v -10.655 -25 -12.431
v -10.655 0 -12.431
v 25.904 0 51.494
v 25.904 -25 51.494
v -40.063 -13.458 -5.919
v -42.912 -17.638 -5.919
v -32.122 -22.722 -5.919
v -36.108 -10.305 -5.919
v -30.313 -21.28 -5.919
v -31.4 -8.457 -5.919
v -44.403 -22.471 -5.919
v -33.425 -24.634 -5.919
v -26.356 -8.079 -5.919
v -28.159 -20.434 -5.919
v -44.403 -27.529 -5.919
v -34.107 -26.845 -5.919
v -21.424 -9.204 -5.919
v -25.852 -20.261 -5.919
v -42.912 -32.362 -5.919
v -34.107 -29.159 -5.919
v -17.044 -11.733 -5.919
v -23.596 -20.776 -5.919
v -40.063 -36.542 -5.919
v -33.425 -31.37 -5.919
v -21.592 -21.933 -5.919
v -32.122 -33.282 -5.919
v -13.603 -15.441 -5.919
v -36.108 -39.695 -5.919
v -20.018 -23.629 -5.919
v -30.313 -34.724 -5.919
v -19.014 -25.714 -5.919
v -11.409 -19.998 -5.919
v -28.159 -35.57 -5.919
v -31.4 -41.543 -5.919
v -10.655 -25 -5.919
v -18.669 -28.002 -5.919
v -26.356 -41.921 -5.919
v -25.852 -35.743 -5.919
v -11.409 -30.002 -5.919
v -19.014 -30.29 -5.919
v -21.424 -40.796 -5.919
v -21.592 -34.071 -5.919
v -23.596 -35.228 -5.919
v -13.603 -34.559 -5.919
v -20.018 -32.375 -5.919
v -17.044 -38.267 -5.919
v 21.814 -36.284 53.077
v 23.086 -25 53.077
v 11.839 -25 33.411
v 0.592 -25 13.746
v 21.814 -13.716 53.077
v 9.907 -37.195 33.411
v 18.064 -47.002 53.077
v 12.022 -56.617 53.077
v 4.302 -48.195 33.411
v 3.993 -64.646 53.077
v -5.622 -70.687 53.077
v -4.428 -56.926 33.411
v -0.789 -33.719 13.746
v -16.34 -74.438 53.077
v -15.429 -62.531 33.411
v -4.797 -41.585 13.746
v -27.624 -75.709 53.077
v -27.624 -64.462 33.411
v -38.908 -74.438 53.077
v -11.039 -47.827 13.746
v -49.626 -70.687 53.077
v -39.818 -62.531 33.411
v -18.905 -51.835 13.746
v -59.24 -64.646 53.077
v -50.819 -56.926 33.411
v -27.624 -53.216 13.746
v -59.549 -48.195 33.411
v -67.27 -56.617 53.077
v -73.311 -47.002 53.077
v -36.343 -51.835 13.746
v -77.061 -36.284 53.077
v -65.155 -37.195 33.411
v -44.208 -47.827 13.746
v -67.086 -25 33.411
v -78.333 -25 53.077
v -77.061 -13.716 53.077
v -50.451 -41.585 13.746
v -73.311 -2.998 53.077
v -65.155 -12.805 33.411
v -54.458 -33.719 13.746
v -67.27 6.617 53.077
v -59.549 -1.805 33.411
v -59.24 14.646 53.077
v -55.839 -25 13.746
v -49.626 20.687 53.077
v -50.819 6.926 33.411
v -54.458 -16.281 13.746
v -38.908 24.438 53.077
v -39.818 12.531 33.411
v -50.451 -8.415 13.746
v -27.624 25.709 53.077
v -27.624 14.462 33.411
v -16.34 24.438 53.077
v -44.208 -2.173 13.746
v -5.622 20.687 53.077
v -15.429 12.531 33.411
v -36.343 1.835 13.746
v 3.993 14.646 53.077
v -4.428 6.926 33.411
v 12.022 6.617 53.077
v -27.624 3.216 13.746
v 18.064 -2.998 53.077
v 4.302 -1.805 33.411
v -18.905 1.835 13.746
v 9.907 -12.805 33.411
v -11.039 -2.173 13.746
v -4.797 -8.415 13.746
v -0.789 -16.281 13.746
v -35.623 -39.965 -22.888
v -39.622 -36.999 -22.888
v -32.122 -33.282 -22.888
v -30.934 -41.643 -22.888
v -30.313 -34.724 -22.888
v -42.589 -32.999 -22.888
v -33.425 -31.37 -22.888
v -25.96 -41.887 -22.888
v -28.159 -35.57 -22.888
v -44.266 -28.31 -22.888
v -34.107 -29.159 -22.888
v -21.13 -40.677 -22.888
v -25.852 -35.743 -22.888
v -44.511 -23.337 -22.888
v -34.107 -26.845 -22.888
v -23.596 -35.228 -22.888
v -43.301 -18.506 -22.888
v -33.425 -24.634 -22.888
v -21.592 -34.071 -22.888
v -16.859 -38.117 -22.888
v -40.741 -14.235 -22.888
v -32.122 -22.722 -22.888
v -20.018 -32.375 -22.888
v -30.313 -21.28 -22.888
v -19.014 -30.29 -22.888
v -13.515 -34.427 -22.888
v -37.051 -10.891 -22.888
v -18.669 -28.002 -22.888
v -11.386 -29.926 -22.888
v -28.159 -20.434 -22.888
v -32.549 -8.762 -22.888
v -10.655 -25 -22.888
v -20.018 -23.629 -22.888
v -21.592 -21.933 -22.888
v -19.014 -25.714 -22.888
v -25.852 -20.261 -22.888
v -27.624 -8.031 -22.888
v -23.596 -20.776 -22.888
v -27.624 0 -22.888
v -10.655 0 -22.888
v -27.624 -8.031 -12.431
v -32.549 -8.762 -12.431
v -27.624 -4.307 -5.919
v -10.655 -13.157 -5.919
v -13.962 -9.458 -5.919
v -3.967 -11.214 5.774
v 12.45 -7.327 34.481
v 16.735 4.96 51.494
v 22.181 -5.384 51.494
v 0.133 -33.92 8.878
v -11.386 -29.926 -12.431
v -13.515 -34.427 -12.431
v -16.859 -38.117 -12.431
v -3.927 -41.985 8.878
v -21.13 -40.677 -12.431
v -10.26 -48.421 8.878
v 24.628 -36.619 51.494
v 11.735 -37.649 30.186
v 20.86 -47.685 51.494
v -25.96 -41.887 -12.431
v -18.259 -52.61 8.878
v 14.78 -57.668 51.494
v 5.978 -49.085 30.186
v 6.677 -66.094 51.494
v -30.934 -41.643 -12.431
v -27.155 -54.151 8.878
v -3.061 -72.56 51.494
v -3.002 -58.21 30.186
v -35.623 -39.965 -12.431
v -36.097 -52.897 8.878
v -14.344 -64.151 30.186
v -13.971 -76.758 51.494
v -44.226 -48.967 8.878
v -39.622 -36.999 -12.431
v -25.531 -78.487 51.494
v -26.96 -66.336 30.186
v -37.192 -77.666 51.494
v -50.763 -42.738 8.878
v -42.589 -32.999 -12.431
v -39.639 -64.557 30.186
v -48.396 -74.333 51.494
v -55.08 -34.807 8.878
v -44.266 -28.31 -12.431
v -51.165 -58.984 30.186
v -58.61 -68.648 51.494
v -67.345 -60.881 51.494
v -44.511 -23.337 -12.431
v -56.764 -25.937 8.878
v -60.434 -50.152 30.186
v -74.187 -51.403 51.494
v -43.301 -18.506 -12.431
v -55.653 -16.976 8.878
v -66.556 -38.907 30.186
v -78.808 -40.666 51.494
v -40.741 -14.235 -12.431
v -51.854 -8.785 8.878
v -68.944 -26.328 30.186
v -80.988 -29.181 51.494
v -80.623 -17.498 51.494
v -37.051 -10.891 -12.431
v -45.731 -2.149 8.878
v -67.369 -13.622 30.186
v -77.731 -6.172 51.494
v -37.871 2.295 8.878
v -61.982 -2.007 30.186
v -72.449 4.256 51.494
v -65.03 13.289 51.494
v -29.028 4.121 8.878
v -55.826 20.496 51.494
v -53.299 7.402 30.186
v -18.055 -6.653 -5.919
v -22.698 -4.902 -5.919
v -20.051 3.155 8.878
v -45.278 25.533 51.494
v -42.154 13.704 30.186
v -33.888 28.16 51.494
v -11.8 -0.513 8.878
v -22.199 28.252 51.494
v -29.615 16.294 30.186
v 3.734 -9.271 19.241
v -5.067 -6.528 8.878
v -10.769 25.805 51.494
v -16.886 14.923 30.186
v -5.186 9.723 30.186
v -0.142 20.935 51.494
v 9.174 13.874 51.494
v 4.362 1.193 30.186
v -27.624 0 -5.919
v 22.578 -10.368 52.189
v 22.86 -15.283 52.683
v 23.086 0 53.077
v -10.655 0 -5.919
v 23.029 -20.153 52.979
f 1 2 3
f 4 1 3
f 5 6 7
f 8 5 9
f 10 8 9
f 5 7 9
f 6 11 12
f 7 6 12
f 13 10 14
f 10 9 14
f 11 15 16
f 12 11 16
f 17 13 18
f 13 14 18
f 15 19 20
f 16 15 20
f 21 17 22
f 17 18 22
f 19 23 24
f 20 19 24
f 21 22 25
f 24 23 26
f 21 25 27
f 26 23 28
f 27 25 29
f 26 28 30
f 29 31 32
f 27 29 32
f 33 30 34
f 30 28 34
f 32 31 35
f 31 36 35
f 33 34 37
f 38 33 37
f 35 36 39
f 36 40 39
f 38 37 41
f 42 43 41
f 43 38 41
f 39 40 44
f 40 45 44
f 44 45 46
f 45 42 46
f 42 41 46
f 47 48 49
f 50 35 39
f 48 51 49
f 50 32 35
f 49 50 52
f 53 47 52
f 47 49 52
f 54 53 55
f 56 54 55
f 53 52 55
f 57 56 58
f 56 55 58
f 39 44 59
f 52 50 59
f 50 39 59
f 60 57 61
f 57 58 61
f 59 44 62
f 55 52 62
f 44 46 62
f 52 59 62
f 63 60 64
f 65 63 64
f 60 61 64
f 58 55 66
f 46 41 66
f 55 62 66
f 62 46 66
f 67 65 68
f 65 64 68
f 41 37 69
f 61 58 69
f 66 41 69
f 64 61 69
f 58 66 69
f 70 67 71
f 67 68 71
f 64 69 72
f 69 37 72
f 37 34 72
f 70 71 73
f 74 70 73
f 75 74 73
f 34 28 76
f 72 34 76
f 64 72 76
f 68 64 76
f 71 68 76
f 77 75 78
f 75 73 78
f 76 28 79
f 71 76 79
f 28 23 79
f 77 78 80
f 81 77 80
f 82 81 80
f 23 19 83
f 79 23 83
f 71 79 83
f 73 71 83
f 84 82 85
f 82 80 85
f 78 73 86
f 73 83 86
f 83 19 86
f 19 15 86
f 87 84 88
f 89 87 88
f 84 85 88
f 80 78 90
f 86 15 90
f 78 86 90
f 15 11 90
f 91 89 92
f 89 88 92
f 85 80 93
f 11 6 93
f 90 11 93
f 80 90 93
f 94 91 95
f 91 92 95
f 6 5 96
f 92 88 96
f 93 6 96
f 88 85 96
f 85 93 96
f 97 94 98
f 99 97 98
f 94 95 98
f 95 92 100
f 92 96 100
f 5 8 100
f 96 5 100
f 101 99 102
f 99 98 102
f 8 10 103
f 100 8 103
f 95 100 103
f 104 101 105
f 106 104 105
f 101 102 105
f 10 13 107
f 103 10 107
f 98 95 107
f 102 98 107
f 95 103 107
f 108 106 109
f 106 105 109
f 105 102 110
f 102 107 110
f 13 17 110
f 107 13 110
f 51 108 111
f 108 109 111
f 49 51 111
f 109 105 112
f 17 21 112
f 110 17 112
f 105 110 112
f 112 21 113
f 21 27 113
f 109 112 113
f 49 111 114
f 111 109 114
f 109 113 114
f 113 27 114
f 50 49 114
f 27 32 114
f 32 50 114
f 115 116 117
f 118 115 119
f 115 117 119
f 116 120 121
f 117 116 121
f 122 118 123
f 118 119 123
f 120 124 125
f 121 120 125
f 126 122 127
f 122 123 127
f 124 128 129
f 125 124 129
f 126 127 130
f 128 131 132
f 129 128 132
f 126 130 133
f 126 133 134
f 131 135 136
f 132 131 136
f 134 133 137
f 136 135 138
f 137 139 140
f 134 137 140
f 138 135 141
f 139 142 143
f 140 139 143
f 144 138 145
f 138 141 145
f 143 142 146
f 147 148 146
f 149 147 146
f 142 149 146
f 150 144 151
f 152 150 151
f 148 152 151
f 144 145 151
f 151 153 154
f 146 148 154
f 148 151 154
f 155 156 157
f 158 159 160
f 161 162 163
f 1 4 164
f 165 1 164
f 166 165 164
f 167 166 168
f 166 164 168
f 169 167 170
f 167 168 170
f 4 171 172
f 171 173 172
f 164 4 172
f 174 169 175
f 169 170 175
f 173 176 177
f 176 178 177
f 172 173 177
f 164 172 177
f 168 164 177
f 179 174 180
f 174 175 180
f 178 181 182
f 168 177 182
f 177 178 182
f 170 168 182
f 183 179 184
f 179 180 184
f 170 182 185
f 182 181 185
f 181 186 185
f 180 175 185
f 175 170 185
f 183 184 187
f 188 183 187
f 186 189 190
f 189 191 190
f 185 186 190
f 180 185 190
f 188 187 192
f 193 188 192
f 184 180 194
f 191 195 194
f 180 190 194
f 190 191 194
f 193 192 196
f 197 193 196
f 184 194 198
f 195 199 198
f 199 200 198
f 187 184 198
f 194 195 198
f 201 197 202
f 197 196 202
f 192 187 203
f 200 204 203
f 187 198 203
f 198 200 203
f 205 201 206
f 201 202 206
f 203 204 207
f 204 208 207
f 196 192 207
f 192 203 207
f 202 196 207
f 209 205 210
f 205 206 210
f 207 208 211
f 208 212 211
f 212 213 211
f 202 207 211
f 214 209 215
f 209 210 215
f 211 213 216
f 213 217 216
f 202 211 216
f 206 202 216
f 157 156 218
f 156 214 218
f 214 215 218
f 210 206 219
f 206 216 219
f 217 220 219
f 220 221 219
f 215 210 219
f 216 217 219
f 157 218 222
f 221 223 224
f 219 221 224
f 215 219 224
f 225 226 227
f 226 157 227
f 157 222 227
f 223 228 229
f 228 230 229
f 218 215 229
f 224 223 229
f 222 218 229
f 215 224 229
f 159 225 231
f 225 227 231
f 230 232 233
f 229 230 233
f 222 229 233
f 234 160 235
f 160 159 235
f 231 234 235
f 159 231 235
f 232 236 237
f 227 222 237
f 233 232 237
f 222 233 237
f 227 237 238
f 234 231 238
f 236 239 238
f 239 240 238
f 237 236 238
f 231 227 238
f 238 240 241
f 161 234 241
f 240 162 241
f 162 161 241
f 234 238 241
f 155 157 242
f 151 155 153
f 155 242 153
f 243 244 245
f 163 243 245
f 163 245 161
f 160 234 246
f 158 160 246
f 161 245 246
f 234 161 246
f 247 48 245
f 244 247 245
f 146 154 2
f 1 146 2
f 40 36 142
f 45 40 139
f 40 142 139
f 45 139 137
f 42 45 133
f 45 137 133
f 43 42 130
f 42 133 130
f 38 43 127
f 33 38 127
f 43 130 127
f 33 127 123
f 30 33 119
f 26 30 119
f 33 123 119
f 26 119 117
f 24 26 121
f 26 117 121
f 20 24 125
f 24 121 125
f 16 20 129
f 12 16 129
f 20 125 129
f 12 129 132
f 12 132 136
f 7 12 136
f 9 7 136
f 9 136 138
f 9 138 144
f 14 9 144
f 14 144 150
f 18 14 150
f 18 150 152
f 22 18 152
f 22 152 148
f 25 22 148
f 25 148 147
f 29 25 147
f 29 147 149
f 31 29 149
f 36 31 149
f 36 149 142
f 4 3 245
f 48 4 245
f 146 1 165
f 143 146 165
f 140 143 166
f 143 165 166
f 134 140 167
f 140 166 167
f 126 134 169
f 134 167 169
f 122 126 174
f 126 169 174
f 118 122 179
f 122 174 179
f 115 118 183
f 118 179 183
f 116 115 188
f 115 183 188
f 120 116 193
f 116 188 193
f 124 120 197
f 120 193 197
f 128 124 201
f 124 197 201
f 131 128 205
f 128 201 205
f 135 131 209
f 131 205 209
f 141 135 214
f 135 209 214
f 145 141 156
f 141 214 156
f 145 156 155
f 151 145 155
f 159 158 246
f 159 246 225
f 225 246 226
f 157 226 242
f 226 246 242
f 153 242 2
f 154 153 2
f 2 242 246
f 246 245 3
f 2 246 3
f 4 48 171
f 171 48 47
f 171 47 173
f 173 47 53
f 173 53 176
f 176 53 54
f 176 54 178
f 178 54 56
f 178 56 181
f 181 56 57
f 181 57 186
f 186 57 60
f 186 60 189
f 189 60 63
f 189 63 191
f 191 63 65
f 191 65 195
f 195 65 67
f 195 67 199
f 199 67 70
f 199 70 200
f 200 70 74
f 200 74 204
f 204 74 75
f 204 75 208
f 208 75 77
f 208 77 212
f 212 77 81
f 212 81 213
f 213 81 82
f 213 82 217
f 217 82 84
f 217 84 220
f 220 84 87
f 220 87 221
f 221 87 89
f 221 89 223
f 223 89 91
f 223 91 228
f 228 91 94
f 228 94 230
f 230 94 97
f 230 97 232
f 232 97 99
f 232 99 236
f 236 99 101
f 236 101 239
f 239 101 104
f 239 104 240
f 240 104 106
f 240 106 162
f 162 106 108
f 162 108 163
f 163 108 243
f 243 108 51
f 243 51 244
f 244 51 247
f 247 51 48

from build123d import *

# Parameters (mm, degrees)
F1_DEPTH = 25
F3_R     = 7.7623093382
F4_DEPTH = 25


with BuildPart() as f1:
    # F0 (on Front) → F1 (new body)
    with BuildSketch(Plane.XZ):
        Polygon((25.9043528415, 51.4944938206), (23.085501045, 53.0769191682), (-10.6548462063, -5.9193591587), (-27.623673901, -5.9193591587), (-27.623673901, -22.8881891817), (-10.6548462063, -22.8881891817), (-10.6548462063, -12.4306539074), align=None)
    extrude(amount=F1_DEPTH)

    # F1_face (on face) → F2 (revolve)
    with BuildSketch(Plane(origin=(-7.5947034843, -25, 1.5087803319), x_dir=(1, 0, 0), z_dir=(0, -1, 0))):
        Polygon((33.4990563258, 49.9857134887), (30.6802045293, 51.5681388363), (-3.060142722, -7.4281394906), (-20.0289704167, -7.4281394906), (-20.0289704167, -24.3969695136), (-3.060142722, -24.3969695136), (-3.060142722, -13.9394342393), align=None)
    revolve(axis=Axis((-27.623673901, -25, -14.4037741702), (0, 0, -1)))

    # F3 (on face) → F4 (cut)
    with BuildSketch(Plane(origin=(0, 0, -22.8881891817), x_dir=(1, 0, 0), z_dir=(0, 0, -1))):
        with Locations((-26.4316089451, 28.0019678175)):
            Circle(F3_R)
    extrude(amount=-F4_DEPTH, mode=Mode.SUBTRACT)


solid = f1.part
